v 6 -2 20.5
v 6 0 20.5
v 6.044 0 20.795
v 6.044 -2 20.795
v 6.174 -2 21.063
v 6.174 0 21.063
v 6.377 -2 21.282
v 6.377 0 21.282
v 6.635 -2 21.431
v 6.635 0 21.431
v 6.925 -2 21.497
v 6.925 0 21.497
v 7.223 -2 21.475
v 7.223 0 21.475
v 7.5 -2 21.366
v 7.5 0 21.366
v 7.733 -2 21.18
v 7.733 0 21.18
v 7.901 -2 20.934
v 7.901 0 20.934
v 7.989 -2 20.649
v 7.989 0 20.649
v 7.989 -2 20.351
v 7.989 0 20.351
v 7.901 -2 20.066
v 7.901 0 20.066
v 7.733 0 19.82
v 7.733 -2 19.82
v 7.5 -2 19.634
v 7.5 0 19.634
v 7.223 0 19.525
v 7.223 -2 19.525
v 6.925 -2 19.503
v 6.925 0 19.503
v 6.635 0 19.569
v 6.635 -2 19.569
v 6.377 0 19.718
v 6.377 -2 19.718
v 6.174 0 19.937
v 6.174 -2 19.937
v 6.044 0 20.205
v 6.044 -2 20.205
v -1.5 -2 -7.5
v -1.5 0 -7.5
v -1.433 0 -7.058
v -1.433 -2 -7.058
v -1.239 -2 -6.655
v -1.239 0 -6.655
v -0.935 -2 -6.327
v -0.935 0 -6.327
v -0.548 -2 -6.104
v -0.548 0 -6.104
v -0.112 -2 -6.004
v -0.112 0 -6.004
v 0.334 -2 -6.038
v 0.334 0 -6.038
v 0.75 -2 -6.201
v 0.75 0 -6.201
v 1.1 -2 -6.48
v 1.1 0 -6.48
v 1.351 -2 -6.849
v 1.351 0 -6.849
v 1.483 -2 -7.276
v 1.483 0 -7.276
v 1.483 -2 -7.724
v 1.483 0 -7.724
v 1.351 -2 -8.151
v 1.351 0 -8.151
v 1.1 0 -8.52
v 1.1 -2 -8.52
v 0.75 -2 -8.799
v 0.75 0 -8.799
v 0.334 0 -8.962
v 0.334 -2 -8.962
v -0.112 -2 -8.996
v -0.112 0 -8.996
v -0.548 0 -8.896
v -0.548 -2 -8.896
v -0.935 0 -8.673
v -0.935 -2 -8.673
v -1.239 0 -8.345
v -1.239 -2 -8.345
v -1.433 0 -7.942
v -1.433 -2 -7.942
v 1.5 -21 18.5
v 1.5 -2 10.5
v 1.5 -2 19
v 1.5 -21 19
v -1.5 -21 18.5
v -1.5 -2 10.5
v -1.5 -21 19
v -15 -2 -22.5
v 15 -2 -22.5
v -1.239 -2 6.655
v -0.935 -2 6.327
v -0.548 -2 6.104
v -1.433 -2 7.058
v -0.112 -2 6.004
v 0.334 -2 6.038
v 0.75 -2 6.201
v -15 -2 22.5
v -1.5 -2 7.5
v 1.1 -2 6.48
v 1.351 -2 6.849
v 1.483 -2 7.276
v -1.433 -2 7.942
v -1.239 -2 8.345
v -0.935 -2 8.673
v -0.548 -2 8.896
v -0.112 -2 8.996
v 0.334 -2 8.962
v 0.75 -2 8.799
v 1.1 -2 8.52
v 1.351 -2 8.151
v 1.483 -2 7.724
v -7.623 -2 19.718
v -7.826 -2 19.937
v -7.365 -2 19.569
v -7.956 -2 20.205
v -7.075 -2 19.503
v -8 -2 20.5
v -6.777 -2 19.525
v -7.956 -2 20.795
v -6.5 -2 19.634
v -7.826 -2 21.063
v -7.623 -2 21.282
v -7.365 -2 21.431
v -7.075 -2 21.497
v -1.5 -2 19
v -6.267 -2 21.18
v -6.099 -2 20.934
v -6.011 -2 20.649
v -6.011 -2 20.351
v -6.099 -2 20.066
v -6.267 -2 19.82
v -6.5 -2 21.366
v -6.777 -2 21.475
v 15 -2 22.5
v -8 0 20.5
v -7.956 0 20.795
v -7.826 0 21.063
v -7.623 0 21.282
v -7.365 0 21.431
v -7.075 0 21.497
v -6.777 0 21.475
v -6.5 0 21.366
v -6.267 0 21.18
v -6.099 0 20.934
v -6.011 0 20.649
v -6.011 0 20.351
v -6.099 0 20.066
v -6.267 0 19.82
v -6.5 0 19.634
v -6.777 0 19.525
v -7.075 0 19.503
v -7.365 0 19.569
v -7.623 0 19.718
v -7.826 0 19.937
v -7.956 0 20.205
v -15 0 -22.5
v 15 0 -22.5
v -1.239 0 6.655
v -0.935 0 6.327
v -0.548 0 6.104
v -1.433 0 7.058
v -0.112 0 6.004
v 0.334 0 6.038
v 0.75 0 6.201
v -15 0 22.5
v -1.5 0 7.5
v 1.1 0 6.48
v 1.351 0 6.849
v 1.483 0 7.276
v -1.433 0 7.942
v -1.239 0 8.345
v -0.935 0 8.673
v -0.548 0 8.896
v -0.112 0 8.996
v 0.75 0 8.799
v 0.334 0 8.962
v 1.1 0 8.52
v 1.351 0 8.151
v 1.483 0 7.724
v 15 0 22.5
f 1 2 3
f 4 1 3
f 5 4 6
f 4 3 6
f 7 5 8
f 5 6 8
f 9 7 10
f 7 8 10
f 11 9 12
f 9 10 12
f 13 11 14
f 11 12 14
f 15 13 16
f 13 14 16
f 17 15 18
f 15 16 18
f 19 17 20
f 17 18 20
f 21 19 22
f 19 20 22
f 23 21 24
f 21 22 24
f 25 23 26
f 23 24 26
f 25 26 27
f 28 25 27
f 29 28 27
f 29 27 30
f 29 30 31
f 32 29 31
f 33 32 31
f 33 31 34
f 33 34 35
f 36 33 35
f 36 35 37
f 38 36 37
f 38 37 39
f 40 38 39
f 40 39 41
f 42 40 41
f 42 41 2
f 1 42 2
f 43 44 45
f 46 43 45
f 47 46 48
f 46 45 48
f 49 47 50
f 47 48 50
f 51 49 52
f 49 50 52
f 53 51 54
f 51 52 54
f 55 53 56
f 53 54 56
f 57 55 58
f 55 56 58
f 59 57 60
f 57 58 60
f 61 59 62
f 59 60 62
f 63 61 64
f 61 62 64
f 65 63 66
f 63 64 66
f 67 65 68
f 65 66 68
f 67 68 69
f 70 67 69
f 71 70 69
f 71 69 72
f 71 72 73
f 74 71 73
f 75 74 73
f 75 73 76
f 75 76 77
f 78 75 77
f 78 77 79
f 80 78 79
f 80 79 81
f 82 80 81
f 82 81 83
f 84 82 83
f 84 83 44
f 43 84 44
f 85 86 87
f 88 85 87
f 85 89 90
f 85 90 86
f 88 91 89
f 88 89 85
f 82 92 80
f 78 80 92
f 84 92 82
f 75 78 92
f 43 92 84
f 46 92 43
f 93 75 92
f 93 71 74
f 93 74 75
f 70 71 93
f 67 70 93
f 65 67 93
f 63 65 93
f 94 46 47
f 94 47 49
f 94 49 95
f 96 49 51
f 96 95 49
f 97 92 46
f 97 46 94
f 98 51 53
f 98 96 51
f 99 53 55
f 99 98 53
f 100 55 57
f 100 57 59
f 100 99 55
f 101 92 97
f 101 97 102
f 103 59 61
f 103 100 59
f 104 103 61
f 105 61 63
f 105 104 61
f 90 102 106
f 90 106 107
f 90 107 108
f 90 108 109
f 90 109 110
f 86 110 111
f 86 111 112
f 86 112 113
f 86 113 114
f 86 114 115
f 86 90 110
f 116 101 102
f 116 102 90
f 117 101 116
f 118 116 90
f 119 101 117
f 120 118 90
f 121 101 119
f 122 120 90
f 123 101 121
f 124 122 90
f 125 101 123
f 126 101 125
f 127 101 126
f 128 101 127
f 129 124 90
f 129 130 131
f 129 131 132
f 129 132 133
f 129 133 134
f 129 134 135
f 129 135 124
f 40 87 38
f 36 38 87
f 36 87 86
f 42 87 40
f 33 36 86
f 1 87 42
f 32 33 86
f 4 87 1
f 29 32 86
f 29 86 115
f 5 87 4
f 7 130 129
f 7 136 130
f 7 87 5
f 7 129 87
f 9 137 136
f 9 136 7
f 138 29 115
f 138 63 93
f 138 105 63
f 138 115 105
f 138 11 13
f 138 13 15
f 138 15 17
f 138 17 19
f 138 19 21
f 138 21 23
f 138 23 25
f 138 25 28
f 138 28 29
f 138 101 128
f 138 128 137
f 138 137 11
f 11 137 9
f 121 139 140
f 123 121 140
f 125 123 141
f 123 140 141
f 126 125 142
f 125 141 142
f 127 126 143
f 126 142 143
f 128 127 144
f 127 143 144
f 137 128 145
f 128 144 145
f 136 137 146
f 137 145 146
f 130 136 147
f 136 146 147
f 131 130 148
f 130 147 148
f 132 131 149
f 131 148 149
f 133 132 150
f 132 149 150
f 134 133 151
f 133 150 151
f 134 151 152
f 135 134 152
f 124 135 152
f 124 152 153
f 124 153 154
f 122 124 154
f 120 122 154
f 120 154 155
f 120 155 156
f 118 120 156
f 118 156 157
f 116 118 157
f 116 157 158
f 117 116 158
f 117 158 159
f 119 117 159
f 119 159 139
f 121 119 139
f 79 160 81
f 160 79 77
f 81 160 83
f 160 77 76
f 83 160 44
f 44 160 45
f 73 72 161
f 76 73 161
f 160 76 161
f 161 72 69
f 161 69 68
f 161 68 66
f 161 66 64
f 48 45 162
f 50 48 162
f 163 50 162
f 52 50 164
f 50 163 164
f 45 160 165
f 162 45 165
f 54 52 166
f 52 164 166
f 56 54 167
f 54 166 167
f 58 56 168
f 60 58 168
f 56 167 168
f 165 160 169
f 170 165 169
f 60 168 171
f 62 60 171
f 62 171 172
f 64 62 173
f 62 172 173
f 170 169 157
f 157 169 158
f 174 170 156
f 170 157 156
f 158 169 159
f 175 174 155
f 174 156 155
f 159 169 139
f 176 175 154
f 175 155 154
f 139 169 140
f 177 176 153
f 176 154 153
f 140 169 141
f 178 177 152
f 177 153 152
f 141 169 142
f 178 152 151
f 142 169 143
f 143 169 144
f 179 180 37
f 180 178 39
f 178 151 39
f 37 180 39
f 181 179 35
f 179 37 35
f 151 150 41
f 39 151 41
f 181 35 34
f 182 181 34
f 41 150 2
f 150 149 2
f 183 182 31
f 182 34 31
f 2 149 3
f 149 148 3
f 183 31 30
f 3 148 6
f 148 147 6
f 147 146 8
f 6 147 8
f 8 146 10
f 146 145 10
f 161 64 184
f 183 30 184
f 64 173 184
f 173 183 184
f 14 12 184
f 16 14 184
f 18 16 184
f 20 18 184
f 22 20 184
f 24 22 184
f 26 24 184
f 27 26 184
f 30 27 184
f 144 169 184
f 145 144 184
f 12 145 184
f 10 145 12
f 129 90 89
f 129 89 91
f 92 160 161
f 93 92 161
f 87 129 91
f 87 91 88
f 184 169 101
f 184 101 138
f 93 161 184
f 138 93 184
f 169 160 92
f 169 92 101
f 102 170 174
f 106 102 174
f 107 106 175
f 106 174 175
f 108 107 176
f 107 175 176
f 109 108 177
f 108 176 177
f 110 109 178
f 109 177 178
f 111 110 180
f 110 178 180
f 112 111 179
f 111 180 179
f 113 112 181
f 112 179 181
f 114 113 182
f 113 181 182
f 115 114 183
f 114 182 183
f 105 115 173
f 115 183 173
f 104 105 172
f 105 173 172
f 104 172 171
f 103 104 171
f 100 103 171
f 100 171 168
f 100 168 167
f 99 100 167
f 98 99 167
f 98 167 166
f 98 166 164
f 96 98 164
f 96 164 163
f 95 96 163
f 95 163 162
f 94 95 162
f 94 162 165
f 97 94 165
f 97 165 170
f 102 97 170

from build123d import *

# Parameters (mm, degrees)
F0_W     = 30
F0_H     = 45
F1_DEPTH = 2
F3_D     = 2
F4_D     = 3
F2_W     = 3
F2_H     = 8.5
F5_DEPTH = 19
F6_SIZE2 = 18.99999
F6_SIZE  = 7.99999


# Not quite as in the source:
# - a fillet or chamfer is up to 0.001 mm smaller than in the source, because OpenCascade refuses the exact size


with BuildPart() as f1:
    # F0 (on Front) → F1 (new body)
    with BuildSketch(Plane.XZ):
        Rectangle(F0_W, F0_H)
    extrude(amount=F1_DEPTH)

    # F3 (through all)
    with Locations(Plane.XZ.offset(2)):
        with Locations((-7, 20.5), (7, 20.5)):
            Hole(F3_D / 2)

    # F4 (through all)
    with Locations(Plane.XZ.offset(2)):
        with Locations((0, 7.5), (0, -7.5)):
            Hole(F4_D / 2)

    # F2 (on face) → F5 (join)
    with BuildSketch(Plane.XZ.offset(2)):
        with Locations((0, 14.75)):
            Rectangle(F2_W, F2_H)
    extrude(amount=F5_DEPTH)

    # F6 (size 8 and 19 in the source; OpenCascade refuses exactly that, so slightly less here)
    f6_edges = [f1.edges().sort_by_distance(p)[0] for p in [
        (0, -21, 10.5),
    ]]
    f6_side = f1.faces().sort_by_distance((0, -21, 14.75))[0]
    chamfer(f6_edges, length=F6_SIZE, length2=F6_SIZE2, reference=f6_side)


solid = f1.part
